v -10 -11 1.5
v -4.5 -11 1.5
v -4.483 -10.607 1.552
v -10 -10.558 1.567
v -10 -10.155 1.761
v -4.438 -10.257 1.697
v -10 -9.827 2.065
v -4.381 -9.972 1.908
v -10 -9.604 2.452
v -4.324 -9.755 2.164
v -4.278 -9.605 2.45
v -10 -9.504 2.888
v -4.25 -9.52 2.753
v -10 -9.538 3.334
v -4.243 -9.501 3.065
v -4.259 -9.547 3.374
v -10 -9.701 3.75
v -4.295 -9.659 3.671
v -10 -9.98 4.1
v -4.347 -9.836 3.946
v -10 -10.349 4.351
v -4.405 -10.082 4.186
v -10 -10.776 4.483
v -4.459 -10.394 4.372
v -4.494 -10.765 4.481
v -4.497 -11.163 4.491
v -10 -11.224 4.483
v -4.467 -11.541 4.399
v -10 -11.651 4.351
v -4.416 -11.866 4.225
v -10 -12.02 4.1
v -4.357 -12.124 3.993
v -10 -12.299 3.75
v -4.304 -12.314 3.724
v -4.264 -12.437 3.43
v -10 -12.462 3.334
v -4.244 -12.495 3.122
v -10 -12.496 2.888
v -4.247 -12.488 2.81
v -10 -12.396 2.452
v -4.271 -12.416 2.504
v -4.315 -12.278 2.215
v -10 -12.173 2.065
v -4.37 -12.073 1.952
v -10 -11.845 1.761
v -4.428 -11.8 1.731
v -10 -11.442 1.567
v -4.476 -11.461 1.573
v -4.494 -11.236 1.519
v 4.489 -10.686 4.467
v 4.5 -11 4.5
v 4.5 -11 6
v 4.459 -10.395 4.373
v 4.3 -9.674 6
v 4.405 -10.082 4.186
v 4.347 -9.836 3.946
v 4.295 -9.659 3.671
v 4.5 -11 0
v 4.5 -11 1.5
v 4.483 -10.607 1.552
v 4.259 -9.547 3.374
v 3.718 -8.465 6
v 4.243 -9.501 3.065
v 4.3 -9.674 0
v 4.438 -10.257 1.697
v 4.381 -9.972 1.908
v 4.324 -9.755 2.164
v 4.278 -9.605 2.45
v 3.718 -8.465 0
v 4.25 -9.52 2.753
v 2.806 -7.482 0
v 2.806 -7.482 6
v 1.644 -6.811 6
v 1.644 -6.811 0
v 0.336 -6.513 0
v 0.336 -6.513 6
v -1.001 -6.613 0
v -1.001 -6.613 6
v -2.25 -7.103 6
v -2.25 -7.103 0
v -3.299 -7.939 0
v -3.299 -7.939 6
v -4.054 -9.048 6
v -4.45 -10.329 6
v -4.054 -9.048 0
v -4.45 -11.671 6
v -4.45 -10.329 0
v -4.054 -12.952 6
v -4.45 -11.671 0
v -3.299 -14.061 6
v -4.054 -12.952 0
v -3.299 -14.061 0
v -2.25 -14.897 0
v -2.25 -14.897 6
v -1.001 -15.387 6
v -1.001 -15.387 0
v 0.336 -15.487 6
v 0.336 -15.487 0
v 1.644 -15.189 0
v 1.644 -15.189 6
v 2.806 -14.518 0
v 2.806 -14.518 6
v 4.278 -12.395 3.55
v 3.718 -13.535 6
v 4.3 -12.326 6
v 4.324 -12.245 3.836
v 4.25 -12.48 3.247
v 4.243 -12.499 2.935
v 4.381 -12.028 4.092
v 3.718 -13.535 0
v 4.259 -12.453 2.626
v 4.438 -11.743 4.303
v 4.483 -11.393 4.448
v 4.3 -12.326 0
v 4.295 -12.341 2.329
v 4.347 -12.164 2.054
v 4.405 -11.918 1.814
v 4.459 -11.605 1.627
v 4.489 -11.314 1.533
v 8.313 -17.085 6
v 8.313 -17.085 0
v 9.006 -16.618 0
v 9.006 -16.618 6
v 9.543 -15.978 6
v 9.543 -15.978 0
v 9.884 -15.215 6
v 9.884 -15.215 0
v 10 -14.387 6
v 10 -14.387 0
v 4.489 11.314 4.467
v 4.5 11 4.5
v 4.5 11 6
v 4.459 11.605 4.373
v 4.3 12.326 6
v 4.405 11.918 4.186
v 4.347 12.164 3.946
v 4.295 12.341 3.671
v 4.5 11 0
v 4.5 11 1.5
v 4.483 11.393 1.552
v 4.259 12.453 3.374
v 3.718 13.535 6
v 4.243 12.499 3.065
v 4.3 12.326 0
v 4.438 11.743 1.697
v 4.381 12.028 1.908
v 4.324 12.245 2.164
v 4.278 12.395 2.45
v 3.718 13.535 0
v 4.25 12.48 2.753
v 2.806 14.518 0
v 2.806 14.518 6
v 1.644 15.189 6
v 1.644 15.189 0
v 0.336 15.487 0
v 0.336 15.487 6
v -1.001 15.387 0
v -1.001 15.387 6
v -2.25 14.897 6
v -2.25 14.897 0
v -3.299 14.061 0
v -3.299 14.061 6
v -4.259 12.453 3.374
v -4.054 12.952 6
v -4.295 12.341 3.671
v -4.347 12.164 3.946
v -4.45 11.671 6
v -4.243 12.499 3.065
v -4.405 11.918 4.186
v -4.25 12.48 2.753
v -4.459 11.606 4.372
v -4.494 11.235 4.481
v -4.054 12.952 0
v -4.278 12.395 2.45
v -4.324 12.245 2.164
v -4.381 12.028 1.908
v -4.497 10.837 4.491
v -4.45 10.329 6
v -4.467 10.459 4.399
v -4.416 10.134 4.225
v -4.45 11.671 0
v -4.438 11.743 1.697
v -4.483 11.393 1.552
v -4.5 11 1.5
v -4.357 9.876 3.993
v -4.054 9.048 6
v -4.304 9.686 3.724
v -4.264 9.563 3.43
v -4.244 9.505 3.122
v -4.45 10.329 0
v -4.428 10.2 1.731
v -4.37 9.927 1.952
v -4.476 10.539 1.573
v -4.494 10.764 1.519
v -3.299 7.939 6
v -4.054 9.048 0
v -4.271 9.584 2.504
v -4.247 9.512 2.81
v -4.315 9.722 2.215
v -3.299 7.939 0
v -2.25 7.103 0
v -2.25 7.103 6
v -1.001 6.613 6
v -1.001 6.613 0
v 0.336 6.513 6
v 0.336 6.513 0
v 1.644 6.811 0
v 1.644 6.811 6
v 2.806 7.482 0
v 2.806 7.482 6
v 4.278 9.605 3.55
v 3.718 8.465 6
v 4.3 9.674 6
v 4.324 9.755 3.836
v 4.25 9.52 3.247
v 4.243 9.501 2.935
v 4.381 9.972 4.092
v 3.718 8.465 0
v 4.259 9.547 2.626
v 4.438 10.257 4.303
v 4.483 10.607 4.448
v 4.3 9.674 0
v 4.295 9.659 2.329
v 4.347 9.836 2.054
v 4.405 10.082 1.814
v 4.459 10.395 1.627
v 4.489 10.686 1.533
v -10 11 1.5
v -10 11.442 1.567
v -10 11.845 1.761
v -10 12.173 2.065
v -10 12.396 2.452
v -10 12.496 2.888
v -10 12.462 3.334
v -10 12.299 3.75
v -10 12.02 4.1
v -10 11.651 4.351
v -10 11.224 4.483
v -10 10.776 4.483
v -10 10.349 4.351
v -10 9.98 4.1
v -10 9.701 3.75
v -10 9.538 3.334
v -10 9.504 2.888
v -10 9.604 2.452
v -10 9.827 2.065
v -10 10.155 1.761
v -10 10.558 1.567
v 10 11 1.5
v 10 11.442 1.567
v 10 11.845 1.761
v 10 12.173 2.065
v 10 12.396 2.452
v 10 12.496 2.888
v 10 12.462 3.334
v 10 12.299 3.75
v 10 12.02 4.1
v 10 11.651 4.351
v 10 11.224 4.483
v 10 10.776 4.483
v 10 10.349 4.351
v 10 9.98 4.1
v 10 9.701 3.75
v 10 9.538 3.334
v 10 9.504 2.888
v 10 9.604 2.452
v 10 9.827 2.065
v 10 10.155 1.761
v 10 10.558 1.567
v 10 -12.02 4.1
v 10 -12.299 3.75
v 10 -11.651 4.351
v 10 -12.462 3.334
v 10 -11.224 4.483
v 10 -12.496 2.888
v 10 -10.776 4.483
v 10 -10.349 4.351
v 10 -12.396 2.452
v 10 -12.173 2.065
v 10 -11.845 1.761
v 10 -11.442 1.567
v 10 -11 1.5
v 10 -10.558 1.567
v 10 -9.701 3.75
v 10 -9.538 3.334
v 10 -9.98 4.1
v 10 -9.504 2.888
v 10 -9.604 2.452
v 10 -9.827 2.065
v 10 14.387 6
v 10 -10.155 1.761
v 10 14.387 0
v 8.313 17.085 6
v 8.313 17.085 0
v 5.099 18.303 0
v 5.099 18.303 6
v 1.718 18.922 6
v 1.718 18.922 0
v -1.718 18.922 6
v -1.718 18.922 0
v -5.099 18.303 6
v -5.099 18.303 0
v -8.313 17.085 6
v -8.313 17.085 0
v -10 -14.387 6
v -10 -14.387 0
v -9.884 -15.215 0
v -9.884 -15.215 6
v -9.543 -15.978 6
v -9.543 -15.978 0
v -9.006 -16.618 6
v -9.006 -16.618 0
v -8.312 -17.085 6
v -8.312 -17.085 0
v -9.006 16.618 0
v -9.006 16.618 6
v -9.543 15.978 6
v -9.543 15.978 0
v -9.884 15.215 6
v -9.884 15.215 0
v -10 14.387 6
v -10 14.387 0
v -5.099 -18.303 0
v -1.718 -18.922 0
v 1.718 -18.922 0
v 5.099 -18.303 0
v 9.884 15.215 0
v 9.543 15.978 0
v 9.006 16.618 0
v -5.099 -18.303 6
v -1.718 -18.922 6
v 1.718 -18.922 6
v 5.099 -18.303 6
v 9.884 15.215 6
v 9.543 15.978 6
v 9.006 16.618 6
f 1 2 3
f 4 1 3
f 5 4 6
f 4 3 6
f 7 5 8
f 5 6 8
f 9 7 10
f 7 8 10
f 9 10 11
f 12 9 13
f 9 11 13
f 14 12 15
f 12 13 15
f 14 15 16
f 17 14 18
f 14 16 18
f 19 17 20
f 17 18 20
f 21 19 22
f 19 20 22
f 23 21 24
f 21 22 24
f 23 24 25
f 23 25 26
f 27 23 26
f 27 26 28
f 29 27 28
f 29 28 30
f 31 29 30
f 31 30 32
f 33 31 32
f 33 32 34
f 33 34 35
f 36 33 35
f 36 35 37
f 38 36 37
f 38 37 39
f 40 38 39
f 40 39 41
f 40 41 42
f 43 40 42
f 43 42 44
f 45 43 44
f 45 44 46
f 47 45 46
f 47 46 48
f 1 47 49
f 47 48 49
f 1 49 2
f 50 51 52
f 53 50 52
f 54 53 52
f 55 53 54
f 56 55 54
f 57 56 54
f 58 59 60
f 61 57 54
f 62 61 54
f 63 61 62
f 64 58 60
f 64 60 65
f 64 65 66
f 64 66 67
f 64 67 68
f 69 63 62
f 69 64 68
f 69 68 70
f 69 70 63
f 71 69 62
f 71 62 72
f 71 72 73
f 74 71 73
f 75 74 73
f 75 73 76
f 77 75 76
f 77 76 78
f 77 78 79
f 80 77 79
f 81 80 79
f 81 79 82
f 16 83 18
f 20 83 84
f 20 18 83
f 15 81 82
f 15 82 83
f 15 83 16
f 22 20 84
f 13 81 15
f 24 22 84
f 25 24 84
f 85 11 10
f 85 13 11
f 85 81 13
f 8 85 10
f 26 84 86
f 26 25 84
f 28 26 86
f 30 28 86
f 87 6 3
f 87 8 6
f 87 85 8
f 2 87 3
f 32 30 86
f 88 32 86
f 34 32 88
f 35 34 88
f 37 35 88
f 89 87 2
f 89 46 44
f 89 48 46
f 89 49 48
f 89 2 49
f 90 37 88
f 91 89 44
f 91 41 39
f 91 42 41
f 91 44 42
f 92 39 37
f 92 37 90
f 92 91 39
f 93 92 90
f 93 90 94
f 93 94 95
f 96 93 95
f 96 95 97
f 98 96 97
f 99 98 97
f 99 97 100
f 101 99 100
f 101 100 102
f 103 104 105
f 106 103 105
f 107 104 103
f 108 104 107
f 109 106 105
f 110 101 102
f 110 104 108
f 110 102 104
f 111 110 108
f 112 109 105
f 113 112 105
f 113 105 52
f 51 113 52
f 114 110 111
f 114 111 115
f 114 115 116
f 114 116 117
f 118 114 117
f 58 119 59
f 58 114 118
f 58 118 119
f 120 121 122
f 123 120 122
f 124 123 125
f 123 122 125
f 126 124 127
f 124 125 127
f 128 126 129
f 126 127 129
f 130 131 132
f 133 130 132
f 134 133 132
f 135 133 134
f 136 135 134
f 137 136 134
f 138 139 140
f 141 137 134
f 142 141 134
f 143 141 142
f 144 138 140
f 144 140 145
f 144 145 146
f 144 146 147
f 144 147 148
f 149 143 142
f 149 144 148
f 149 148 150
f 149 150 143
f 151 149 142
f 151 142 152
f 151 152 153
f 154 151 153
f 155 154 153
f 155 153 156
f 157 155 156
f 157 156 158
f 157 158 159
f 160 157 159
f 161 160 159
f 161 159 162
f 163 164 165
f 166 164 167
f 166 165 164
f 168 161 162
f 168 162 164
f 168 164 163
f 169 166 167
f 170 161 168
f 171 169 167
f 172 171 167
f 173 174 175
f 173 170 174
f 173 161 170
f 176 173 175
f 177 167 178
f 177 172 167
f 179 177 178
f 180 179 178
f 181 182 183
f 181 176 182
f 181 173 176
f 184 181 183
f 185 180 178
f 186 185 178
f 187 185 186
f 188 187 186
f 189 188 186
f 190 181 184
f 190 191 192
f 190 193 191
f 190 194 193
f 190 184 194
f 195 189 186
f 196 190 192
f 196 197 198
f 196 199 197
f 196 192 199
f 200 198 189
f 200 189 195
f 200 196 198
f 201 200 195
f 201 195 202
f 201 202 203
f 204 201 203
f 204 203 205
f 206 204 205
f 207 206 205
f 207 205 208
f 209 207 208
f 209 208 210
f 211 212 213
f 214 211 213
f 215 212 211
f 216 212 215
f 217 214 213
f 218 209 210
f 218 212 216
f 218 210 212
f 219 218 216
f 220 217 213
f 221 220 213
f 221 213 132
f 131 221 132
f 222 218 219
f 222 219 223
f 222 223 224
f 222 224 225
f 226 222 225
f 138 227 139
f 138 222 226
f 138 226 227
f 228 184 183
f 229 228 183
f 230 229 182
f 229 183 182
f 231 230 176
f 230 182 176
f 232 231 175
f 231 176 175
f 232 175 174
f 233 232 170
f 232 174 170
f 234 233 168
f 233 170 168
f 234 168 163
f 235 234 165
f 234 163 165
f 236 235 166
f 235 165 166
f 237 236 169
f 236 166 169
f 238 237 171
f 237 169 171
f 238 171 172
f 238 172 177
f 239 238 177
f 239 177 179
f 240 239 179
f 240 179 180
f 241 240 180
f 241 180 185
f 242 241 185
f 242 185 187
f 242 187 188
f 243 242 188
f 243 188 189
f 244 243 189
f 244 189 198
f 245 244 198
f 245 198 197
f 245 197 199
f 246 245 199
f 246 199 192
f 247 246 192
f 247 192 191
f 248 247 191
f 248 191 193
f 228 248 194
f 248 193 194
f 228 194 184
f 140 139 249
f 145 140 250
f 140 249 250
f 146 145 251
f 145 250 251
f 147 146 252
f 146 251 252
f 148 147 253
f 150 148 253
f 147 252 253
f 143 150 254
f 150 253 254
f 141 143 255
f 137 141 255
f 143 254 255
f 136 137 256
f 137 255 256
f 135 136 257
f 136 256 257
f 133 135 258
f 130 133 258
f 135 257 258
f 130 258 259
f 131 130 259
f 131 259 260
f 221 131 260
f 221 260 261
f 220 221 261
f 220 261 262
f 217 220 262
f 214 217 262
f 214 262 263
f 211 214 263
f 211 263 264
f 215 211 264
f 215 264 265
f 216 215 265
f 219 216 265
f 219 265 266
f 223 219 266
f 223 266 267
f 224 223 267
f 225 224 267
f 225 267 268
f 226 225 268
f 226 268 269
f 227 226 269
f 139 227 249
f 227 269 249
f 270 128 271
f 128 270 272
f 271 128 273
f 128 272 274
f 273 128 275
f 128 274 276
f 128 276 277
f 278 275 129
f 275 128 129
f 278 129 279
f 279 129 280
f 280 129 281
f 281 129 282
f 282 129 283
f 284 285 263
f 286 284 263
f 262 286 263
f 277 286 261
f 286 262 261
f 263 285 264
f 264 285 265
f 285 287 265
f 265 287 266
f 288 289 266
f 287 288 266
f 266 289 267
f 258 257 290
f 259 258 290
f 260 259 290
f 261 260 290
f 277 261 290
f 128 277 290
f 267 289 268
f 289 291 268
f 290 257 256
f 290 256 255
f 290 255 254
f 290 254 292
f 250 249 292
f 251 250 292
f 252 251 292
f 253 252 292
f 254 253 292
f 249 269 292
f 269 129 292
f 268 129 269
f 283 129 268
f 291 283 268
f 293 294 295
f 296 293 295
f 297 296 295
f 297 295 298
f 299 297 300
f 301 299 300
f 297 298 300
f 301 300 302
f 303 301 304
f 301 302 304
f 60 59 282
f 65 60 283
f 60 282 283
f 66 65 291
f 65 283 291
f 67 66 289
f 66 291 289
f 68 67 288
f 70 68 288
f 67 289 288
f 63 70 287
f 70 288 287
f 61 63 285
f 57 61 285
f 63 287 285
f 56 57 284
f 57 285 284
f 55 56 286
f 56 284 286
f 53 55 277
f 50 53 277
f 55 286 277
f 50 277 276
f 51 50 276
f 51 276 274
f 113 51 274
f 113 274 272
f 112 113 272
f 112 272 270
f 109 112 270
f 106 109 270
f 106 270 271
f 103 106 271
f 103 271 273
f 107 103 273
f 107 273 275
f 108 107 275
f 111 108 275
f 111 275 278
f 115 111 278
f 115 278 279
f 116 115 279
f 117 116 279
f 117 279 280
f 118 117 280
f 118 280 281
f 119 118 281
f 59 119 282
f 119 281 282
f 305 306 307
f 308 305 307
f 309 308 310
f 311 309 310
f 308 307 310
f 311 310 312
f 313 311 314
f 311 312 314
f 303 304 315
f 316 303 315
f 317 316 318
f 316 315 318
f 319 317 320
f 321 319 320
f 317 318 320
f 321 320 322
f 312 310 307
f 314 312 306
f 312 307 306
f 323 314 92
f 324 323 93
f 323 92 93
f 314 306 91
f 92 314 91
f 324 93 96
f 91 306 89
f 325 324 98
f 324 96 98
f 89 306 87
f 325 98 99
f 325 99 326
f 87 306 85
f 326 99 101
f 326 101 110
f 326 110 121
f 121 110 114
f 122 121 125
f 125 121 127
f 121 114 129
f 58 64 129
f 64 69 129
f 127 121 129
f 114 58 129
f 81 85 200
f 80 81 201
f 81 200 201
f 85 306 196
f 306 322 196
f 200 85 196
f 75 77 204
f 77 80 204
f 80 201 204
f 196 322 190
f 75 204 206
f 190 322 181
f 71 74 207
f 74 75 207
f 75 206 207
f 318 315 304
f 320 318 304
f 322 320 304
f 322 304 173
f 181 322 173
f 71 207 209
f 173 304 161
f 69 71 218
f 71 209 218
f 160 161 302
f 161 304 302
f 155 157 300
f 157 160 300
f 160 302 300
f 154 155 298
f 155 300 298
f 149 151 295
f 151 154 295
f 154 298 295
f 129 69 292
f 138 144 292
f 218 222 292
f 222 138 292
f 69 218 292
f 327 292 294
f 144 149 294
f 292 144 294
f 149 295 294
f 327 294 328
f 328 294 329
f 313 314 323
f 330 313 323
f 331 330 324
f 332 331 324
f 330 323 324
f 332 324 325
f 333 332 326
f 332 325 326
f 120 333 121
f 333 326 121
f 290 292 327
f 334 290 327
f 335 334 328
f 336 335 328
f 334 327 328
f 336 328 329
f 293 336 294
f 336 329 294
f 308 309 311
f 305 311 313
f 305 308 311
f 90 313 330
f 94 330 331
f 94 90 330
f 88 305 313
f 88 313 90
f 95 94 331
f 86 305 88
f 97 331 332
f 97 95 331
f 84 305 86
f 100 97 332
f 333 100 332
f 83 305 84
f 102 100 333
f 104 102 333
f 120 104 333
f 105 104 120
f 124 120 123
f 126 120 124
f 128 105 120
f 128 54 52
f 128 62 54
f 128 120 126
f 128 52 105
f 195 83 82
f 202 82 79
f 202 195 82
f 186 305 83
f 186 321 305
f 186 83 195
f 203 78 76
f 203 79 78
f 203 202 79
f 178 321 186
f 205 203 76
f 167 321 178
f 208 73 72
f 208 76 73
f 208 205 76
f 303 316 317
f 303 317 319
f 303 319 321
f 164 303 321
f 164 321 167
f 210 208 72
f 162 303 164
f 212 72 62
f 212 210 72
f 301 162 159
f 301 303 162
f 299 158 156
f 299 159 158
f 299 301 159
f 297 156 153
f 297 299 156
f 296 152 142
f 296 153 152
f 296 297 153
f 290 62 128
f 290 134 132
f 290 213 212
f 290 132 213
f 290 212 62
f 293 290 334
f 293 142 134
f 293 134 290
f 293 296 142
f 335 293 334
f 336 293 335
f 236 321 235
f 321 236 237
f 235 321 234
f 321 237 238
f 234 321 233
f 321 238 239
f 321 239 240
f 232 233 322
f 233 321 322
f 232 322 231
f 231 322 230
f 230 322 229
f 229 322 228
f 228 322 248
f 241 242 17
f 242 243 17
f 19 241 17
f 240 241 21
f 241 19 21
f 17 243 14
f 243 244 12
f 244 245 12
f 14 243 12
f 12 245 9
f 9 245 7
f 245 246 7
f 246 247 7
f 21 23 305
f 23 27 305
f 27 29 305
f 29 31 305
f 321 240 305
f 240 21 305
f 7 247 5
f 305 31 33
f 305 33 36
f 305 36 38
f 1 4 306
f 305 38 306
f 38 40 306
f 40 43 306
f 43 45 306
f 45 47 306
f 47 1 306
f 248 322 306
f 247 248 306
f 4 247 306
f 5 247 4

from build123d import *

# Parameters (mm, degrees)
SKETCH1_R               = 4.5
SKETCH1_R_2             = 3
BOSS_EXTRUDE1_DEPTH     = 6
SKETCH2_R               = 1.5
CUT_EXTRUDE1_DEPTH      = 1
CUT_EXTRUDE1_DEPTH_BACK = 21


with BuildPart() as part:
    # Sketch1 → Boss-Extrude1 (new body)
    with BuildSketch(Plane.XY):
        with BuildLine():
            Line((-10, 0), (0, 0))
            Line((0, 0), (10, 0))
            Line((10, 0), (10, 14.38749457))
            ThreePointArc((10, 14.38749457), (4.456626225, 12.796504363), (8.312500108, 17.085149749))
            ThreePointArc((8.312500108, 17.085149749), (2.5e-08, 19), (-8.312500062, 17.085149771))
            ThreePointArc((-8.312500062, 17.085149771), (-5.409009772, 16.930868332), (-4, 14.38749457))
            ThreePointArc((-4, 14.38749457), (-7, 11.38749457), (-10, 14.38749457))
            Line((-10, 14.38749457), (-10, 0))
        make_face()
        with Locations((0, 11)):
            Circle(SKETCH1_R, mode=Mode.SUBTRACT)
        with Locations((7, 14.38749457)):
            Circle(SKETCH1_R_2)
        with Locations((-7, 14.38749457)):
            Circle(SKETCH1_R_2)
        with BuildLine():
            Line((10, 0), (0, 0))
            Line((0, 0), (-10, 0))
            Line((-10, 0), (-10, -14.38749457))
            ThreePointArc((-10, -14.38749457), (-7, -11.38749457), (-4, -14.38749457))
            ThreePointArc((-4, -14.38749457), (-5.409009694, -16.930868283), (-8.312499897, -17.085149852))
            ThreePointArc((-8.312499897, -17.085149852), (9.1e-08, -19), (8.312500061, -17.085149772))
            ThreePointArc((8.312500061, -17.085149772), (4.456626238, -12.796504341), (10, -14.38749457))
            Line((10, -14.38749457), (10, 0))
        make_face()
        with Locations((0, -11)):
            Circle(SKETCH1_R, mode=Mode.SUBTRACT)
        with Locations((-7, -14.38749457)):
            Circle(SKETCH1_R_2)
        with Locations((7, -14.38749457)):
            Circle(SKETCH1_R_2)
    extrude(amount=BOSS_EXTRUDE1_DEPTH)

    # Sketch2 → Cut-Extrude1 (cut, two sides)
    with BuildSketch(Plane(origin=(10, 0, 0), x_dir=(0, 0, -1), z_dir=(1, 0, 0))) as cut_extrude1_sk:
        with Locations((-3, 11)):
            Circle(SKETCH2_R)
        with Locations((-3, -11)):
            Circle(SKETCH2_R)
    extrude(amount=CUT_EXTRUDE1_DEPTH, mode=Mode.SUBTRACT)
    extrude(cut_extrude1_sk.sketch, amount=-CUT_EXTRUDE1_DEPTH_BACK, mode=Mode.SUBTRACT)


solid = part.part
